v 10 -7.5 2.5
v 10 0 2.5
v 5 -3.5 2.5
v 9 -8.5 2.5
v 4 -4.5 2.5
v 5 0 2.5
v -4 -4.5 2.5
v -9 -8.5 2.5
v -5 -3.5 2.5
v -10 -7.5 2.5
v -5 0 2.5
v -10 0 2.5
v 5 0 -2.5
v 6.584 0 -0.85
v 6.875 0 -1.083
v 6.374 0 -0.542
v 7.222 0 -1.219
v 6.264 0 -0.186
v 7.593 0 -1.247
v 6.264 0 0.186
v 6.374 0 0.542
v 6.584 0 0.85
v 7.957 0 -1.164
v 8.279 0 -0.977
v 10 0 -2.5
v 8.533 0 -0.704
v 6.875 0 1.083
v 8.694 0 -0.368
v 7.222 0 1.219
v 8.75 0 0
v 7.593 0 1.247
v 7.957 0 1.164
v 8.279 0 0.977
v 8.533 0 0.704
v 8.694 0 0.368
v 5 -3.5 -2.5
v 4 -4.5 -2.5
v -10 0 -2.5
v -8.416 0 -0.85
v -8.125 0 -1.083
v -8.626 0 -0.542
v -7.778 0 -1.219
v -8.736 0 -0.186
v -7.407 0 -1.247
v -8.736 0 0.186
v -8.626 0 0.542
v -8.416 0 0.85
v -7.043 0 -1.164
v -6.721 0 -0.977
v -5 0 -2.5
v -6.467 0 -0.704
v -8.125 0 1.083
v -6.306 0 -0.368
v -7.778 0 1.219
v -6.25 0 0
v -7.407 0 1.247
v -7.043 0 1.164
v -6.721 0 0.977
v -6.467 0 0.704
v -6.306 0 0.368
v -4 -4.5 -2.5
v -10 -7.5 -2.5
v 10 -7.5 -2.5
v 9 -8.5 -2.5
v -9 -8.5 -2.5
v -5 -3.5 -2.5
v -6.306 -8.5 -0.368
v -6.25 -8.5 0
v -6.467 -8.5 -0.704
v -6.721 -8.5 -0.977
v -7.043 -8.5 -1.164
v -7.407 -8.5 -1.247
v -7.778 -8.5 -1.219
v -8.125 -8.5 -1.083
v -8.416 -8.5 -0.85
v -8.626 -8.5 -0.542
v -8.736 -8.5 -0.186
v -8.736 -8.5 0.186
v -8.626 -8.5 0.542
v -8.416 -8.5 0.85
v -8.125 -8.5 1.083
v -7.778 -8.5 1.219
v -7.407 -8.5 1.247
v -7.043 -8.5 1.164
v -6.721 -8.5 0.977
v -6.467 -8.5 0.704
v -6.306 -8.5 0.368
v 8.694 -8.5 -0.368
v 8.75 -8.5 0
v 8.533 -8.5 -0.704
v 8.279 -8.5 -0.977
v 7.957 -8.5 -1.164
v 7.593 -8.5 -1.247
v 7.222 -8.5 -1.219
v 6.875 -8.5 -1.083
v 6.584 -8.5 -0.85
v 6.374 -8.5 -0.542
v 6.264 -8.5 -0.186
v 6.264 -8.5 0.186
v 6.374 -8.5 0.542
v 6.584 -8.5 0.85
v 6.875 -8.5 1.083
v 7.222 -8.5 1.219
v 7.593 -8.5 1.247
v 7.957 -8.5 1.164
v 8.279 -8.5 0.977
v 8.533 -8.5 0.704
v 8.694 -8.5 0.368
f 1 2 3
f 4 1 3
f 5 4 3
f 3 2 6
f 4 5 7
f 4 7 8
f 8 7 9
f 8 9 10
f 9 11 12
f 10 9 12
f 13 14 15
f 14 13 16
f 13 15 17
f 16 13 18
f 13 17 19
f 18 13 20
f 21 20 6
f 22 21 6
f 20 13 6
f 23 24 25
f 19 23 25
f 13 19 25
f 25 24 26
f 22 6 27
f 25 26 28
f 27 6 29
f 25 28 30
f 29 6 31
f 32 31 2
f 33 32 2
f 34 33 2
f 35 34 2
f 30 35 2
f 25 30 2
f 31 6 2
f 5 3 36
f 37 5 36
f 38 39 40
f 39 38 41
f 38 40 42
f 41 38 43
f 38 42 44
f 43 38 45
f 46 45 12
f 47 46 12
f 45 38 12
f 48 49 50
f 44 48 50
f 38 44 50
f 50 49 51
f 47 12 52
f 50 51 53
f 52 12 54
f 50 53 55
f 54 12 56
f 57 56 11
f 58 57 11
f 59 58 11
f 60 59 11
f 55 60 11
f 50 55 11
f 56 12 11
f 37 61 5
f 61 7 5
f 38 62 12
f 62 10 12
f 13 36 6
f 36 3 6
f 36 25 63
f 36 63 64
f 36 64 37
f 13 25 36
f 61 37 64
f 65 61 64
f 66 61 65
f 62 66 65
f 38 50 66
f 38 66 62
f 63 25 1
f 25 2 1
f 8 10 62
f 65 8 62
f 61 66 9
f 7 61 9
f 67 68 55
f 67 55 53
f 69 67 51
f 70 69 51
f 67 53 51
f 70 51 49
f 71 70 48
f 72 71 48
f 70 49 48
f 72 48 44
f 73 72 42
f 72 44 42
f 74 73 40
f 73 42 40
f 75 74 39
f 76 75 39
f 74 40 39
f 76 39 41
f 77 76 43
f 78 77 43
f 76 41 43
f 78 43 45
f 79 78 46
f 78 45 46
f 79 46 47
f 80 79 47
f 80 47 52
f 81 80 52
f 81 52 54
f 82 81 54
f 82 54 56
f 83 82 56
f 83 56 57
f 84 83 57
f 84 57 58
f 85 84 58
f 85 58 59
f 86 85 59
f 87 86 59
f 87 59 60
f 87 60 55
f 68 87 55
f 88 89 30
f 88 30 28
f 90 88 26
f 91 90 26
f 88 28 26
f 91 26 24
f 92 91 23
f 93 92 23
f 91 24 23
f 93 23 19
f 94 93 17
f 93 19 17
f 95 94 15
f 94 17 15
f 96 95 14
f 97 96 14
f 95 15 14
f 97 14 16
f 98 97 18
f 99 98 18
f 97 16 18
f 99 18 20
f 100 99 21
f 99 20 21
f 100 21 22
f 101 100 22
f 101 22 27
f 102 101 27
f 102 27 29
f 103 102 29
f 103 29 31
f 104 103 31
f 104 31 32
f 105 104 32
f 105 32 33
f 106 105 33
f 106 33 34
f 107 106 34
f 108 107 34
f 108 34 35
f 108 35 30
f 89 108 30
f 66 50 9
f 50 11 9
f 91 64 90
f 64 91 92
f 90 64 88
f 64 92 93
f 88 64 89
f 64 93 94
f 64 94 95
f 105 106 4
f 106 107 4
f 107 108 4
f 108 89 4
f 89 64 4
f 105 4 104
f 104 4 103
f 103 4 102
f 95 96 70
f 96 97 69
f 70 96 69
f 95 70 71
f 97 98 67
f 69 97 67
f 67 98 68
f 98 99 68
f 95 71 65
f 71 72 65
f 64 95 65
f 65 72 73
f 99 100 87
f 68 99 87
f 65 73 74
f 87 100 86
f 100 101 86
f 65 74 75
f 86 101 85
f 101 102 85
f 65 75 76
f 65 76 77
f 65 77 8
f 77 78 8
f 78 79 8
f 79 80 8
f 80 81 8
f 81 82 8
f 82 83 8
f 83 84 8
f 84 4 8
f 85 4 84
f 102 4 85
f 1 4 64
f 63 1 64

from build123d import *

# Parameters (mm, degrees)
EXTRUDE_1_DEPTH    = 2.5
HOLE_WIZARD_M3_1_D = 2.5
CHAMFER_1_SIZE     = 1


with BuildPart() as part:
    # 草图1 → 凸台-拉伸1 (new, symmetric)
    with BuildSketch(Plane.XY):
        Polygon((-5, -4.5), (5, -4.5), (5, 0), (10, 0), (10, -8.5), (-10, -8.5), (-10, 0), (-5, 0), align=None)
    extrude(amount=EXTRUDE_1_DEPTH, both=True)

    # M3 螺纹孔1 (through all)
    with Locations(Plane(origin=(0, -8.5, 0), x_dir=(-1, 0, 0), z_dir=(0, -1, 0))):
        with Locations((7.5, 0), (-7.5, 0)):
            Hole(HOLE_WIZARD_M3_1_D / 2)

    # 倒角1
    chamfer_1_edges = [part.edges().sort_by_distance(p)[0] for p in [
        (10, -8.5, 0),
        (-10, -8.5, 0),
        (-5, -4.5, 0),
        (5, -4.5, 0),
    ]]
    chamfer(chamfer_1_edges, length=CHAMFER_1_SIZE)


solid = part.part
